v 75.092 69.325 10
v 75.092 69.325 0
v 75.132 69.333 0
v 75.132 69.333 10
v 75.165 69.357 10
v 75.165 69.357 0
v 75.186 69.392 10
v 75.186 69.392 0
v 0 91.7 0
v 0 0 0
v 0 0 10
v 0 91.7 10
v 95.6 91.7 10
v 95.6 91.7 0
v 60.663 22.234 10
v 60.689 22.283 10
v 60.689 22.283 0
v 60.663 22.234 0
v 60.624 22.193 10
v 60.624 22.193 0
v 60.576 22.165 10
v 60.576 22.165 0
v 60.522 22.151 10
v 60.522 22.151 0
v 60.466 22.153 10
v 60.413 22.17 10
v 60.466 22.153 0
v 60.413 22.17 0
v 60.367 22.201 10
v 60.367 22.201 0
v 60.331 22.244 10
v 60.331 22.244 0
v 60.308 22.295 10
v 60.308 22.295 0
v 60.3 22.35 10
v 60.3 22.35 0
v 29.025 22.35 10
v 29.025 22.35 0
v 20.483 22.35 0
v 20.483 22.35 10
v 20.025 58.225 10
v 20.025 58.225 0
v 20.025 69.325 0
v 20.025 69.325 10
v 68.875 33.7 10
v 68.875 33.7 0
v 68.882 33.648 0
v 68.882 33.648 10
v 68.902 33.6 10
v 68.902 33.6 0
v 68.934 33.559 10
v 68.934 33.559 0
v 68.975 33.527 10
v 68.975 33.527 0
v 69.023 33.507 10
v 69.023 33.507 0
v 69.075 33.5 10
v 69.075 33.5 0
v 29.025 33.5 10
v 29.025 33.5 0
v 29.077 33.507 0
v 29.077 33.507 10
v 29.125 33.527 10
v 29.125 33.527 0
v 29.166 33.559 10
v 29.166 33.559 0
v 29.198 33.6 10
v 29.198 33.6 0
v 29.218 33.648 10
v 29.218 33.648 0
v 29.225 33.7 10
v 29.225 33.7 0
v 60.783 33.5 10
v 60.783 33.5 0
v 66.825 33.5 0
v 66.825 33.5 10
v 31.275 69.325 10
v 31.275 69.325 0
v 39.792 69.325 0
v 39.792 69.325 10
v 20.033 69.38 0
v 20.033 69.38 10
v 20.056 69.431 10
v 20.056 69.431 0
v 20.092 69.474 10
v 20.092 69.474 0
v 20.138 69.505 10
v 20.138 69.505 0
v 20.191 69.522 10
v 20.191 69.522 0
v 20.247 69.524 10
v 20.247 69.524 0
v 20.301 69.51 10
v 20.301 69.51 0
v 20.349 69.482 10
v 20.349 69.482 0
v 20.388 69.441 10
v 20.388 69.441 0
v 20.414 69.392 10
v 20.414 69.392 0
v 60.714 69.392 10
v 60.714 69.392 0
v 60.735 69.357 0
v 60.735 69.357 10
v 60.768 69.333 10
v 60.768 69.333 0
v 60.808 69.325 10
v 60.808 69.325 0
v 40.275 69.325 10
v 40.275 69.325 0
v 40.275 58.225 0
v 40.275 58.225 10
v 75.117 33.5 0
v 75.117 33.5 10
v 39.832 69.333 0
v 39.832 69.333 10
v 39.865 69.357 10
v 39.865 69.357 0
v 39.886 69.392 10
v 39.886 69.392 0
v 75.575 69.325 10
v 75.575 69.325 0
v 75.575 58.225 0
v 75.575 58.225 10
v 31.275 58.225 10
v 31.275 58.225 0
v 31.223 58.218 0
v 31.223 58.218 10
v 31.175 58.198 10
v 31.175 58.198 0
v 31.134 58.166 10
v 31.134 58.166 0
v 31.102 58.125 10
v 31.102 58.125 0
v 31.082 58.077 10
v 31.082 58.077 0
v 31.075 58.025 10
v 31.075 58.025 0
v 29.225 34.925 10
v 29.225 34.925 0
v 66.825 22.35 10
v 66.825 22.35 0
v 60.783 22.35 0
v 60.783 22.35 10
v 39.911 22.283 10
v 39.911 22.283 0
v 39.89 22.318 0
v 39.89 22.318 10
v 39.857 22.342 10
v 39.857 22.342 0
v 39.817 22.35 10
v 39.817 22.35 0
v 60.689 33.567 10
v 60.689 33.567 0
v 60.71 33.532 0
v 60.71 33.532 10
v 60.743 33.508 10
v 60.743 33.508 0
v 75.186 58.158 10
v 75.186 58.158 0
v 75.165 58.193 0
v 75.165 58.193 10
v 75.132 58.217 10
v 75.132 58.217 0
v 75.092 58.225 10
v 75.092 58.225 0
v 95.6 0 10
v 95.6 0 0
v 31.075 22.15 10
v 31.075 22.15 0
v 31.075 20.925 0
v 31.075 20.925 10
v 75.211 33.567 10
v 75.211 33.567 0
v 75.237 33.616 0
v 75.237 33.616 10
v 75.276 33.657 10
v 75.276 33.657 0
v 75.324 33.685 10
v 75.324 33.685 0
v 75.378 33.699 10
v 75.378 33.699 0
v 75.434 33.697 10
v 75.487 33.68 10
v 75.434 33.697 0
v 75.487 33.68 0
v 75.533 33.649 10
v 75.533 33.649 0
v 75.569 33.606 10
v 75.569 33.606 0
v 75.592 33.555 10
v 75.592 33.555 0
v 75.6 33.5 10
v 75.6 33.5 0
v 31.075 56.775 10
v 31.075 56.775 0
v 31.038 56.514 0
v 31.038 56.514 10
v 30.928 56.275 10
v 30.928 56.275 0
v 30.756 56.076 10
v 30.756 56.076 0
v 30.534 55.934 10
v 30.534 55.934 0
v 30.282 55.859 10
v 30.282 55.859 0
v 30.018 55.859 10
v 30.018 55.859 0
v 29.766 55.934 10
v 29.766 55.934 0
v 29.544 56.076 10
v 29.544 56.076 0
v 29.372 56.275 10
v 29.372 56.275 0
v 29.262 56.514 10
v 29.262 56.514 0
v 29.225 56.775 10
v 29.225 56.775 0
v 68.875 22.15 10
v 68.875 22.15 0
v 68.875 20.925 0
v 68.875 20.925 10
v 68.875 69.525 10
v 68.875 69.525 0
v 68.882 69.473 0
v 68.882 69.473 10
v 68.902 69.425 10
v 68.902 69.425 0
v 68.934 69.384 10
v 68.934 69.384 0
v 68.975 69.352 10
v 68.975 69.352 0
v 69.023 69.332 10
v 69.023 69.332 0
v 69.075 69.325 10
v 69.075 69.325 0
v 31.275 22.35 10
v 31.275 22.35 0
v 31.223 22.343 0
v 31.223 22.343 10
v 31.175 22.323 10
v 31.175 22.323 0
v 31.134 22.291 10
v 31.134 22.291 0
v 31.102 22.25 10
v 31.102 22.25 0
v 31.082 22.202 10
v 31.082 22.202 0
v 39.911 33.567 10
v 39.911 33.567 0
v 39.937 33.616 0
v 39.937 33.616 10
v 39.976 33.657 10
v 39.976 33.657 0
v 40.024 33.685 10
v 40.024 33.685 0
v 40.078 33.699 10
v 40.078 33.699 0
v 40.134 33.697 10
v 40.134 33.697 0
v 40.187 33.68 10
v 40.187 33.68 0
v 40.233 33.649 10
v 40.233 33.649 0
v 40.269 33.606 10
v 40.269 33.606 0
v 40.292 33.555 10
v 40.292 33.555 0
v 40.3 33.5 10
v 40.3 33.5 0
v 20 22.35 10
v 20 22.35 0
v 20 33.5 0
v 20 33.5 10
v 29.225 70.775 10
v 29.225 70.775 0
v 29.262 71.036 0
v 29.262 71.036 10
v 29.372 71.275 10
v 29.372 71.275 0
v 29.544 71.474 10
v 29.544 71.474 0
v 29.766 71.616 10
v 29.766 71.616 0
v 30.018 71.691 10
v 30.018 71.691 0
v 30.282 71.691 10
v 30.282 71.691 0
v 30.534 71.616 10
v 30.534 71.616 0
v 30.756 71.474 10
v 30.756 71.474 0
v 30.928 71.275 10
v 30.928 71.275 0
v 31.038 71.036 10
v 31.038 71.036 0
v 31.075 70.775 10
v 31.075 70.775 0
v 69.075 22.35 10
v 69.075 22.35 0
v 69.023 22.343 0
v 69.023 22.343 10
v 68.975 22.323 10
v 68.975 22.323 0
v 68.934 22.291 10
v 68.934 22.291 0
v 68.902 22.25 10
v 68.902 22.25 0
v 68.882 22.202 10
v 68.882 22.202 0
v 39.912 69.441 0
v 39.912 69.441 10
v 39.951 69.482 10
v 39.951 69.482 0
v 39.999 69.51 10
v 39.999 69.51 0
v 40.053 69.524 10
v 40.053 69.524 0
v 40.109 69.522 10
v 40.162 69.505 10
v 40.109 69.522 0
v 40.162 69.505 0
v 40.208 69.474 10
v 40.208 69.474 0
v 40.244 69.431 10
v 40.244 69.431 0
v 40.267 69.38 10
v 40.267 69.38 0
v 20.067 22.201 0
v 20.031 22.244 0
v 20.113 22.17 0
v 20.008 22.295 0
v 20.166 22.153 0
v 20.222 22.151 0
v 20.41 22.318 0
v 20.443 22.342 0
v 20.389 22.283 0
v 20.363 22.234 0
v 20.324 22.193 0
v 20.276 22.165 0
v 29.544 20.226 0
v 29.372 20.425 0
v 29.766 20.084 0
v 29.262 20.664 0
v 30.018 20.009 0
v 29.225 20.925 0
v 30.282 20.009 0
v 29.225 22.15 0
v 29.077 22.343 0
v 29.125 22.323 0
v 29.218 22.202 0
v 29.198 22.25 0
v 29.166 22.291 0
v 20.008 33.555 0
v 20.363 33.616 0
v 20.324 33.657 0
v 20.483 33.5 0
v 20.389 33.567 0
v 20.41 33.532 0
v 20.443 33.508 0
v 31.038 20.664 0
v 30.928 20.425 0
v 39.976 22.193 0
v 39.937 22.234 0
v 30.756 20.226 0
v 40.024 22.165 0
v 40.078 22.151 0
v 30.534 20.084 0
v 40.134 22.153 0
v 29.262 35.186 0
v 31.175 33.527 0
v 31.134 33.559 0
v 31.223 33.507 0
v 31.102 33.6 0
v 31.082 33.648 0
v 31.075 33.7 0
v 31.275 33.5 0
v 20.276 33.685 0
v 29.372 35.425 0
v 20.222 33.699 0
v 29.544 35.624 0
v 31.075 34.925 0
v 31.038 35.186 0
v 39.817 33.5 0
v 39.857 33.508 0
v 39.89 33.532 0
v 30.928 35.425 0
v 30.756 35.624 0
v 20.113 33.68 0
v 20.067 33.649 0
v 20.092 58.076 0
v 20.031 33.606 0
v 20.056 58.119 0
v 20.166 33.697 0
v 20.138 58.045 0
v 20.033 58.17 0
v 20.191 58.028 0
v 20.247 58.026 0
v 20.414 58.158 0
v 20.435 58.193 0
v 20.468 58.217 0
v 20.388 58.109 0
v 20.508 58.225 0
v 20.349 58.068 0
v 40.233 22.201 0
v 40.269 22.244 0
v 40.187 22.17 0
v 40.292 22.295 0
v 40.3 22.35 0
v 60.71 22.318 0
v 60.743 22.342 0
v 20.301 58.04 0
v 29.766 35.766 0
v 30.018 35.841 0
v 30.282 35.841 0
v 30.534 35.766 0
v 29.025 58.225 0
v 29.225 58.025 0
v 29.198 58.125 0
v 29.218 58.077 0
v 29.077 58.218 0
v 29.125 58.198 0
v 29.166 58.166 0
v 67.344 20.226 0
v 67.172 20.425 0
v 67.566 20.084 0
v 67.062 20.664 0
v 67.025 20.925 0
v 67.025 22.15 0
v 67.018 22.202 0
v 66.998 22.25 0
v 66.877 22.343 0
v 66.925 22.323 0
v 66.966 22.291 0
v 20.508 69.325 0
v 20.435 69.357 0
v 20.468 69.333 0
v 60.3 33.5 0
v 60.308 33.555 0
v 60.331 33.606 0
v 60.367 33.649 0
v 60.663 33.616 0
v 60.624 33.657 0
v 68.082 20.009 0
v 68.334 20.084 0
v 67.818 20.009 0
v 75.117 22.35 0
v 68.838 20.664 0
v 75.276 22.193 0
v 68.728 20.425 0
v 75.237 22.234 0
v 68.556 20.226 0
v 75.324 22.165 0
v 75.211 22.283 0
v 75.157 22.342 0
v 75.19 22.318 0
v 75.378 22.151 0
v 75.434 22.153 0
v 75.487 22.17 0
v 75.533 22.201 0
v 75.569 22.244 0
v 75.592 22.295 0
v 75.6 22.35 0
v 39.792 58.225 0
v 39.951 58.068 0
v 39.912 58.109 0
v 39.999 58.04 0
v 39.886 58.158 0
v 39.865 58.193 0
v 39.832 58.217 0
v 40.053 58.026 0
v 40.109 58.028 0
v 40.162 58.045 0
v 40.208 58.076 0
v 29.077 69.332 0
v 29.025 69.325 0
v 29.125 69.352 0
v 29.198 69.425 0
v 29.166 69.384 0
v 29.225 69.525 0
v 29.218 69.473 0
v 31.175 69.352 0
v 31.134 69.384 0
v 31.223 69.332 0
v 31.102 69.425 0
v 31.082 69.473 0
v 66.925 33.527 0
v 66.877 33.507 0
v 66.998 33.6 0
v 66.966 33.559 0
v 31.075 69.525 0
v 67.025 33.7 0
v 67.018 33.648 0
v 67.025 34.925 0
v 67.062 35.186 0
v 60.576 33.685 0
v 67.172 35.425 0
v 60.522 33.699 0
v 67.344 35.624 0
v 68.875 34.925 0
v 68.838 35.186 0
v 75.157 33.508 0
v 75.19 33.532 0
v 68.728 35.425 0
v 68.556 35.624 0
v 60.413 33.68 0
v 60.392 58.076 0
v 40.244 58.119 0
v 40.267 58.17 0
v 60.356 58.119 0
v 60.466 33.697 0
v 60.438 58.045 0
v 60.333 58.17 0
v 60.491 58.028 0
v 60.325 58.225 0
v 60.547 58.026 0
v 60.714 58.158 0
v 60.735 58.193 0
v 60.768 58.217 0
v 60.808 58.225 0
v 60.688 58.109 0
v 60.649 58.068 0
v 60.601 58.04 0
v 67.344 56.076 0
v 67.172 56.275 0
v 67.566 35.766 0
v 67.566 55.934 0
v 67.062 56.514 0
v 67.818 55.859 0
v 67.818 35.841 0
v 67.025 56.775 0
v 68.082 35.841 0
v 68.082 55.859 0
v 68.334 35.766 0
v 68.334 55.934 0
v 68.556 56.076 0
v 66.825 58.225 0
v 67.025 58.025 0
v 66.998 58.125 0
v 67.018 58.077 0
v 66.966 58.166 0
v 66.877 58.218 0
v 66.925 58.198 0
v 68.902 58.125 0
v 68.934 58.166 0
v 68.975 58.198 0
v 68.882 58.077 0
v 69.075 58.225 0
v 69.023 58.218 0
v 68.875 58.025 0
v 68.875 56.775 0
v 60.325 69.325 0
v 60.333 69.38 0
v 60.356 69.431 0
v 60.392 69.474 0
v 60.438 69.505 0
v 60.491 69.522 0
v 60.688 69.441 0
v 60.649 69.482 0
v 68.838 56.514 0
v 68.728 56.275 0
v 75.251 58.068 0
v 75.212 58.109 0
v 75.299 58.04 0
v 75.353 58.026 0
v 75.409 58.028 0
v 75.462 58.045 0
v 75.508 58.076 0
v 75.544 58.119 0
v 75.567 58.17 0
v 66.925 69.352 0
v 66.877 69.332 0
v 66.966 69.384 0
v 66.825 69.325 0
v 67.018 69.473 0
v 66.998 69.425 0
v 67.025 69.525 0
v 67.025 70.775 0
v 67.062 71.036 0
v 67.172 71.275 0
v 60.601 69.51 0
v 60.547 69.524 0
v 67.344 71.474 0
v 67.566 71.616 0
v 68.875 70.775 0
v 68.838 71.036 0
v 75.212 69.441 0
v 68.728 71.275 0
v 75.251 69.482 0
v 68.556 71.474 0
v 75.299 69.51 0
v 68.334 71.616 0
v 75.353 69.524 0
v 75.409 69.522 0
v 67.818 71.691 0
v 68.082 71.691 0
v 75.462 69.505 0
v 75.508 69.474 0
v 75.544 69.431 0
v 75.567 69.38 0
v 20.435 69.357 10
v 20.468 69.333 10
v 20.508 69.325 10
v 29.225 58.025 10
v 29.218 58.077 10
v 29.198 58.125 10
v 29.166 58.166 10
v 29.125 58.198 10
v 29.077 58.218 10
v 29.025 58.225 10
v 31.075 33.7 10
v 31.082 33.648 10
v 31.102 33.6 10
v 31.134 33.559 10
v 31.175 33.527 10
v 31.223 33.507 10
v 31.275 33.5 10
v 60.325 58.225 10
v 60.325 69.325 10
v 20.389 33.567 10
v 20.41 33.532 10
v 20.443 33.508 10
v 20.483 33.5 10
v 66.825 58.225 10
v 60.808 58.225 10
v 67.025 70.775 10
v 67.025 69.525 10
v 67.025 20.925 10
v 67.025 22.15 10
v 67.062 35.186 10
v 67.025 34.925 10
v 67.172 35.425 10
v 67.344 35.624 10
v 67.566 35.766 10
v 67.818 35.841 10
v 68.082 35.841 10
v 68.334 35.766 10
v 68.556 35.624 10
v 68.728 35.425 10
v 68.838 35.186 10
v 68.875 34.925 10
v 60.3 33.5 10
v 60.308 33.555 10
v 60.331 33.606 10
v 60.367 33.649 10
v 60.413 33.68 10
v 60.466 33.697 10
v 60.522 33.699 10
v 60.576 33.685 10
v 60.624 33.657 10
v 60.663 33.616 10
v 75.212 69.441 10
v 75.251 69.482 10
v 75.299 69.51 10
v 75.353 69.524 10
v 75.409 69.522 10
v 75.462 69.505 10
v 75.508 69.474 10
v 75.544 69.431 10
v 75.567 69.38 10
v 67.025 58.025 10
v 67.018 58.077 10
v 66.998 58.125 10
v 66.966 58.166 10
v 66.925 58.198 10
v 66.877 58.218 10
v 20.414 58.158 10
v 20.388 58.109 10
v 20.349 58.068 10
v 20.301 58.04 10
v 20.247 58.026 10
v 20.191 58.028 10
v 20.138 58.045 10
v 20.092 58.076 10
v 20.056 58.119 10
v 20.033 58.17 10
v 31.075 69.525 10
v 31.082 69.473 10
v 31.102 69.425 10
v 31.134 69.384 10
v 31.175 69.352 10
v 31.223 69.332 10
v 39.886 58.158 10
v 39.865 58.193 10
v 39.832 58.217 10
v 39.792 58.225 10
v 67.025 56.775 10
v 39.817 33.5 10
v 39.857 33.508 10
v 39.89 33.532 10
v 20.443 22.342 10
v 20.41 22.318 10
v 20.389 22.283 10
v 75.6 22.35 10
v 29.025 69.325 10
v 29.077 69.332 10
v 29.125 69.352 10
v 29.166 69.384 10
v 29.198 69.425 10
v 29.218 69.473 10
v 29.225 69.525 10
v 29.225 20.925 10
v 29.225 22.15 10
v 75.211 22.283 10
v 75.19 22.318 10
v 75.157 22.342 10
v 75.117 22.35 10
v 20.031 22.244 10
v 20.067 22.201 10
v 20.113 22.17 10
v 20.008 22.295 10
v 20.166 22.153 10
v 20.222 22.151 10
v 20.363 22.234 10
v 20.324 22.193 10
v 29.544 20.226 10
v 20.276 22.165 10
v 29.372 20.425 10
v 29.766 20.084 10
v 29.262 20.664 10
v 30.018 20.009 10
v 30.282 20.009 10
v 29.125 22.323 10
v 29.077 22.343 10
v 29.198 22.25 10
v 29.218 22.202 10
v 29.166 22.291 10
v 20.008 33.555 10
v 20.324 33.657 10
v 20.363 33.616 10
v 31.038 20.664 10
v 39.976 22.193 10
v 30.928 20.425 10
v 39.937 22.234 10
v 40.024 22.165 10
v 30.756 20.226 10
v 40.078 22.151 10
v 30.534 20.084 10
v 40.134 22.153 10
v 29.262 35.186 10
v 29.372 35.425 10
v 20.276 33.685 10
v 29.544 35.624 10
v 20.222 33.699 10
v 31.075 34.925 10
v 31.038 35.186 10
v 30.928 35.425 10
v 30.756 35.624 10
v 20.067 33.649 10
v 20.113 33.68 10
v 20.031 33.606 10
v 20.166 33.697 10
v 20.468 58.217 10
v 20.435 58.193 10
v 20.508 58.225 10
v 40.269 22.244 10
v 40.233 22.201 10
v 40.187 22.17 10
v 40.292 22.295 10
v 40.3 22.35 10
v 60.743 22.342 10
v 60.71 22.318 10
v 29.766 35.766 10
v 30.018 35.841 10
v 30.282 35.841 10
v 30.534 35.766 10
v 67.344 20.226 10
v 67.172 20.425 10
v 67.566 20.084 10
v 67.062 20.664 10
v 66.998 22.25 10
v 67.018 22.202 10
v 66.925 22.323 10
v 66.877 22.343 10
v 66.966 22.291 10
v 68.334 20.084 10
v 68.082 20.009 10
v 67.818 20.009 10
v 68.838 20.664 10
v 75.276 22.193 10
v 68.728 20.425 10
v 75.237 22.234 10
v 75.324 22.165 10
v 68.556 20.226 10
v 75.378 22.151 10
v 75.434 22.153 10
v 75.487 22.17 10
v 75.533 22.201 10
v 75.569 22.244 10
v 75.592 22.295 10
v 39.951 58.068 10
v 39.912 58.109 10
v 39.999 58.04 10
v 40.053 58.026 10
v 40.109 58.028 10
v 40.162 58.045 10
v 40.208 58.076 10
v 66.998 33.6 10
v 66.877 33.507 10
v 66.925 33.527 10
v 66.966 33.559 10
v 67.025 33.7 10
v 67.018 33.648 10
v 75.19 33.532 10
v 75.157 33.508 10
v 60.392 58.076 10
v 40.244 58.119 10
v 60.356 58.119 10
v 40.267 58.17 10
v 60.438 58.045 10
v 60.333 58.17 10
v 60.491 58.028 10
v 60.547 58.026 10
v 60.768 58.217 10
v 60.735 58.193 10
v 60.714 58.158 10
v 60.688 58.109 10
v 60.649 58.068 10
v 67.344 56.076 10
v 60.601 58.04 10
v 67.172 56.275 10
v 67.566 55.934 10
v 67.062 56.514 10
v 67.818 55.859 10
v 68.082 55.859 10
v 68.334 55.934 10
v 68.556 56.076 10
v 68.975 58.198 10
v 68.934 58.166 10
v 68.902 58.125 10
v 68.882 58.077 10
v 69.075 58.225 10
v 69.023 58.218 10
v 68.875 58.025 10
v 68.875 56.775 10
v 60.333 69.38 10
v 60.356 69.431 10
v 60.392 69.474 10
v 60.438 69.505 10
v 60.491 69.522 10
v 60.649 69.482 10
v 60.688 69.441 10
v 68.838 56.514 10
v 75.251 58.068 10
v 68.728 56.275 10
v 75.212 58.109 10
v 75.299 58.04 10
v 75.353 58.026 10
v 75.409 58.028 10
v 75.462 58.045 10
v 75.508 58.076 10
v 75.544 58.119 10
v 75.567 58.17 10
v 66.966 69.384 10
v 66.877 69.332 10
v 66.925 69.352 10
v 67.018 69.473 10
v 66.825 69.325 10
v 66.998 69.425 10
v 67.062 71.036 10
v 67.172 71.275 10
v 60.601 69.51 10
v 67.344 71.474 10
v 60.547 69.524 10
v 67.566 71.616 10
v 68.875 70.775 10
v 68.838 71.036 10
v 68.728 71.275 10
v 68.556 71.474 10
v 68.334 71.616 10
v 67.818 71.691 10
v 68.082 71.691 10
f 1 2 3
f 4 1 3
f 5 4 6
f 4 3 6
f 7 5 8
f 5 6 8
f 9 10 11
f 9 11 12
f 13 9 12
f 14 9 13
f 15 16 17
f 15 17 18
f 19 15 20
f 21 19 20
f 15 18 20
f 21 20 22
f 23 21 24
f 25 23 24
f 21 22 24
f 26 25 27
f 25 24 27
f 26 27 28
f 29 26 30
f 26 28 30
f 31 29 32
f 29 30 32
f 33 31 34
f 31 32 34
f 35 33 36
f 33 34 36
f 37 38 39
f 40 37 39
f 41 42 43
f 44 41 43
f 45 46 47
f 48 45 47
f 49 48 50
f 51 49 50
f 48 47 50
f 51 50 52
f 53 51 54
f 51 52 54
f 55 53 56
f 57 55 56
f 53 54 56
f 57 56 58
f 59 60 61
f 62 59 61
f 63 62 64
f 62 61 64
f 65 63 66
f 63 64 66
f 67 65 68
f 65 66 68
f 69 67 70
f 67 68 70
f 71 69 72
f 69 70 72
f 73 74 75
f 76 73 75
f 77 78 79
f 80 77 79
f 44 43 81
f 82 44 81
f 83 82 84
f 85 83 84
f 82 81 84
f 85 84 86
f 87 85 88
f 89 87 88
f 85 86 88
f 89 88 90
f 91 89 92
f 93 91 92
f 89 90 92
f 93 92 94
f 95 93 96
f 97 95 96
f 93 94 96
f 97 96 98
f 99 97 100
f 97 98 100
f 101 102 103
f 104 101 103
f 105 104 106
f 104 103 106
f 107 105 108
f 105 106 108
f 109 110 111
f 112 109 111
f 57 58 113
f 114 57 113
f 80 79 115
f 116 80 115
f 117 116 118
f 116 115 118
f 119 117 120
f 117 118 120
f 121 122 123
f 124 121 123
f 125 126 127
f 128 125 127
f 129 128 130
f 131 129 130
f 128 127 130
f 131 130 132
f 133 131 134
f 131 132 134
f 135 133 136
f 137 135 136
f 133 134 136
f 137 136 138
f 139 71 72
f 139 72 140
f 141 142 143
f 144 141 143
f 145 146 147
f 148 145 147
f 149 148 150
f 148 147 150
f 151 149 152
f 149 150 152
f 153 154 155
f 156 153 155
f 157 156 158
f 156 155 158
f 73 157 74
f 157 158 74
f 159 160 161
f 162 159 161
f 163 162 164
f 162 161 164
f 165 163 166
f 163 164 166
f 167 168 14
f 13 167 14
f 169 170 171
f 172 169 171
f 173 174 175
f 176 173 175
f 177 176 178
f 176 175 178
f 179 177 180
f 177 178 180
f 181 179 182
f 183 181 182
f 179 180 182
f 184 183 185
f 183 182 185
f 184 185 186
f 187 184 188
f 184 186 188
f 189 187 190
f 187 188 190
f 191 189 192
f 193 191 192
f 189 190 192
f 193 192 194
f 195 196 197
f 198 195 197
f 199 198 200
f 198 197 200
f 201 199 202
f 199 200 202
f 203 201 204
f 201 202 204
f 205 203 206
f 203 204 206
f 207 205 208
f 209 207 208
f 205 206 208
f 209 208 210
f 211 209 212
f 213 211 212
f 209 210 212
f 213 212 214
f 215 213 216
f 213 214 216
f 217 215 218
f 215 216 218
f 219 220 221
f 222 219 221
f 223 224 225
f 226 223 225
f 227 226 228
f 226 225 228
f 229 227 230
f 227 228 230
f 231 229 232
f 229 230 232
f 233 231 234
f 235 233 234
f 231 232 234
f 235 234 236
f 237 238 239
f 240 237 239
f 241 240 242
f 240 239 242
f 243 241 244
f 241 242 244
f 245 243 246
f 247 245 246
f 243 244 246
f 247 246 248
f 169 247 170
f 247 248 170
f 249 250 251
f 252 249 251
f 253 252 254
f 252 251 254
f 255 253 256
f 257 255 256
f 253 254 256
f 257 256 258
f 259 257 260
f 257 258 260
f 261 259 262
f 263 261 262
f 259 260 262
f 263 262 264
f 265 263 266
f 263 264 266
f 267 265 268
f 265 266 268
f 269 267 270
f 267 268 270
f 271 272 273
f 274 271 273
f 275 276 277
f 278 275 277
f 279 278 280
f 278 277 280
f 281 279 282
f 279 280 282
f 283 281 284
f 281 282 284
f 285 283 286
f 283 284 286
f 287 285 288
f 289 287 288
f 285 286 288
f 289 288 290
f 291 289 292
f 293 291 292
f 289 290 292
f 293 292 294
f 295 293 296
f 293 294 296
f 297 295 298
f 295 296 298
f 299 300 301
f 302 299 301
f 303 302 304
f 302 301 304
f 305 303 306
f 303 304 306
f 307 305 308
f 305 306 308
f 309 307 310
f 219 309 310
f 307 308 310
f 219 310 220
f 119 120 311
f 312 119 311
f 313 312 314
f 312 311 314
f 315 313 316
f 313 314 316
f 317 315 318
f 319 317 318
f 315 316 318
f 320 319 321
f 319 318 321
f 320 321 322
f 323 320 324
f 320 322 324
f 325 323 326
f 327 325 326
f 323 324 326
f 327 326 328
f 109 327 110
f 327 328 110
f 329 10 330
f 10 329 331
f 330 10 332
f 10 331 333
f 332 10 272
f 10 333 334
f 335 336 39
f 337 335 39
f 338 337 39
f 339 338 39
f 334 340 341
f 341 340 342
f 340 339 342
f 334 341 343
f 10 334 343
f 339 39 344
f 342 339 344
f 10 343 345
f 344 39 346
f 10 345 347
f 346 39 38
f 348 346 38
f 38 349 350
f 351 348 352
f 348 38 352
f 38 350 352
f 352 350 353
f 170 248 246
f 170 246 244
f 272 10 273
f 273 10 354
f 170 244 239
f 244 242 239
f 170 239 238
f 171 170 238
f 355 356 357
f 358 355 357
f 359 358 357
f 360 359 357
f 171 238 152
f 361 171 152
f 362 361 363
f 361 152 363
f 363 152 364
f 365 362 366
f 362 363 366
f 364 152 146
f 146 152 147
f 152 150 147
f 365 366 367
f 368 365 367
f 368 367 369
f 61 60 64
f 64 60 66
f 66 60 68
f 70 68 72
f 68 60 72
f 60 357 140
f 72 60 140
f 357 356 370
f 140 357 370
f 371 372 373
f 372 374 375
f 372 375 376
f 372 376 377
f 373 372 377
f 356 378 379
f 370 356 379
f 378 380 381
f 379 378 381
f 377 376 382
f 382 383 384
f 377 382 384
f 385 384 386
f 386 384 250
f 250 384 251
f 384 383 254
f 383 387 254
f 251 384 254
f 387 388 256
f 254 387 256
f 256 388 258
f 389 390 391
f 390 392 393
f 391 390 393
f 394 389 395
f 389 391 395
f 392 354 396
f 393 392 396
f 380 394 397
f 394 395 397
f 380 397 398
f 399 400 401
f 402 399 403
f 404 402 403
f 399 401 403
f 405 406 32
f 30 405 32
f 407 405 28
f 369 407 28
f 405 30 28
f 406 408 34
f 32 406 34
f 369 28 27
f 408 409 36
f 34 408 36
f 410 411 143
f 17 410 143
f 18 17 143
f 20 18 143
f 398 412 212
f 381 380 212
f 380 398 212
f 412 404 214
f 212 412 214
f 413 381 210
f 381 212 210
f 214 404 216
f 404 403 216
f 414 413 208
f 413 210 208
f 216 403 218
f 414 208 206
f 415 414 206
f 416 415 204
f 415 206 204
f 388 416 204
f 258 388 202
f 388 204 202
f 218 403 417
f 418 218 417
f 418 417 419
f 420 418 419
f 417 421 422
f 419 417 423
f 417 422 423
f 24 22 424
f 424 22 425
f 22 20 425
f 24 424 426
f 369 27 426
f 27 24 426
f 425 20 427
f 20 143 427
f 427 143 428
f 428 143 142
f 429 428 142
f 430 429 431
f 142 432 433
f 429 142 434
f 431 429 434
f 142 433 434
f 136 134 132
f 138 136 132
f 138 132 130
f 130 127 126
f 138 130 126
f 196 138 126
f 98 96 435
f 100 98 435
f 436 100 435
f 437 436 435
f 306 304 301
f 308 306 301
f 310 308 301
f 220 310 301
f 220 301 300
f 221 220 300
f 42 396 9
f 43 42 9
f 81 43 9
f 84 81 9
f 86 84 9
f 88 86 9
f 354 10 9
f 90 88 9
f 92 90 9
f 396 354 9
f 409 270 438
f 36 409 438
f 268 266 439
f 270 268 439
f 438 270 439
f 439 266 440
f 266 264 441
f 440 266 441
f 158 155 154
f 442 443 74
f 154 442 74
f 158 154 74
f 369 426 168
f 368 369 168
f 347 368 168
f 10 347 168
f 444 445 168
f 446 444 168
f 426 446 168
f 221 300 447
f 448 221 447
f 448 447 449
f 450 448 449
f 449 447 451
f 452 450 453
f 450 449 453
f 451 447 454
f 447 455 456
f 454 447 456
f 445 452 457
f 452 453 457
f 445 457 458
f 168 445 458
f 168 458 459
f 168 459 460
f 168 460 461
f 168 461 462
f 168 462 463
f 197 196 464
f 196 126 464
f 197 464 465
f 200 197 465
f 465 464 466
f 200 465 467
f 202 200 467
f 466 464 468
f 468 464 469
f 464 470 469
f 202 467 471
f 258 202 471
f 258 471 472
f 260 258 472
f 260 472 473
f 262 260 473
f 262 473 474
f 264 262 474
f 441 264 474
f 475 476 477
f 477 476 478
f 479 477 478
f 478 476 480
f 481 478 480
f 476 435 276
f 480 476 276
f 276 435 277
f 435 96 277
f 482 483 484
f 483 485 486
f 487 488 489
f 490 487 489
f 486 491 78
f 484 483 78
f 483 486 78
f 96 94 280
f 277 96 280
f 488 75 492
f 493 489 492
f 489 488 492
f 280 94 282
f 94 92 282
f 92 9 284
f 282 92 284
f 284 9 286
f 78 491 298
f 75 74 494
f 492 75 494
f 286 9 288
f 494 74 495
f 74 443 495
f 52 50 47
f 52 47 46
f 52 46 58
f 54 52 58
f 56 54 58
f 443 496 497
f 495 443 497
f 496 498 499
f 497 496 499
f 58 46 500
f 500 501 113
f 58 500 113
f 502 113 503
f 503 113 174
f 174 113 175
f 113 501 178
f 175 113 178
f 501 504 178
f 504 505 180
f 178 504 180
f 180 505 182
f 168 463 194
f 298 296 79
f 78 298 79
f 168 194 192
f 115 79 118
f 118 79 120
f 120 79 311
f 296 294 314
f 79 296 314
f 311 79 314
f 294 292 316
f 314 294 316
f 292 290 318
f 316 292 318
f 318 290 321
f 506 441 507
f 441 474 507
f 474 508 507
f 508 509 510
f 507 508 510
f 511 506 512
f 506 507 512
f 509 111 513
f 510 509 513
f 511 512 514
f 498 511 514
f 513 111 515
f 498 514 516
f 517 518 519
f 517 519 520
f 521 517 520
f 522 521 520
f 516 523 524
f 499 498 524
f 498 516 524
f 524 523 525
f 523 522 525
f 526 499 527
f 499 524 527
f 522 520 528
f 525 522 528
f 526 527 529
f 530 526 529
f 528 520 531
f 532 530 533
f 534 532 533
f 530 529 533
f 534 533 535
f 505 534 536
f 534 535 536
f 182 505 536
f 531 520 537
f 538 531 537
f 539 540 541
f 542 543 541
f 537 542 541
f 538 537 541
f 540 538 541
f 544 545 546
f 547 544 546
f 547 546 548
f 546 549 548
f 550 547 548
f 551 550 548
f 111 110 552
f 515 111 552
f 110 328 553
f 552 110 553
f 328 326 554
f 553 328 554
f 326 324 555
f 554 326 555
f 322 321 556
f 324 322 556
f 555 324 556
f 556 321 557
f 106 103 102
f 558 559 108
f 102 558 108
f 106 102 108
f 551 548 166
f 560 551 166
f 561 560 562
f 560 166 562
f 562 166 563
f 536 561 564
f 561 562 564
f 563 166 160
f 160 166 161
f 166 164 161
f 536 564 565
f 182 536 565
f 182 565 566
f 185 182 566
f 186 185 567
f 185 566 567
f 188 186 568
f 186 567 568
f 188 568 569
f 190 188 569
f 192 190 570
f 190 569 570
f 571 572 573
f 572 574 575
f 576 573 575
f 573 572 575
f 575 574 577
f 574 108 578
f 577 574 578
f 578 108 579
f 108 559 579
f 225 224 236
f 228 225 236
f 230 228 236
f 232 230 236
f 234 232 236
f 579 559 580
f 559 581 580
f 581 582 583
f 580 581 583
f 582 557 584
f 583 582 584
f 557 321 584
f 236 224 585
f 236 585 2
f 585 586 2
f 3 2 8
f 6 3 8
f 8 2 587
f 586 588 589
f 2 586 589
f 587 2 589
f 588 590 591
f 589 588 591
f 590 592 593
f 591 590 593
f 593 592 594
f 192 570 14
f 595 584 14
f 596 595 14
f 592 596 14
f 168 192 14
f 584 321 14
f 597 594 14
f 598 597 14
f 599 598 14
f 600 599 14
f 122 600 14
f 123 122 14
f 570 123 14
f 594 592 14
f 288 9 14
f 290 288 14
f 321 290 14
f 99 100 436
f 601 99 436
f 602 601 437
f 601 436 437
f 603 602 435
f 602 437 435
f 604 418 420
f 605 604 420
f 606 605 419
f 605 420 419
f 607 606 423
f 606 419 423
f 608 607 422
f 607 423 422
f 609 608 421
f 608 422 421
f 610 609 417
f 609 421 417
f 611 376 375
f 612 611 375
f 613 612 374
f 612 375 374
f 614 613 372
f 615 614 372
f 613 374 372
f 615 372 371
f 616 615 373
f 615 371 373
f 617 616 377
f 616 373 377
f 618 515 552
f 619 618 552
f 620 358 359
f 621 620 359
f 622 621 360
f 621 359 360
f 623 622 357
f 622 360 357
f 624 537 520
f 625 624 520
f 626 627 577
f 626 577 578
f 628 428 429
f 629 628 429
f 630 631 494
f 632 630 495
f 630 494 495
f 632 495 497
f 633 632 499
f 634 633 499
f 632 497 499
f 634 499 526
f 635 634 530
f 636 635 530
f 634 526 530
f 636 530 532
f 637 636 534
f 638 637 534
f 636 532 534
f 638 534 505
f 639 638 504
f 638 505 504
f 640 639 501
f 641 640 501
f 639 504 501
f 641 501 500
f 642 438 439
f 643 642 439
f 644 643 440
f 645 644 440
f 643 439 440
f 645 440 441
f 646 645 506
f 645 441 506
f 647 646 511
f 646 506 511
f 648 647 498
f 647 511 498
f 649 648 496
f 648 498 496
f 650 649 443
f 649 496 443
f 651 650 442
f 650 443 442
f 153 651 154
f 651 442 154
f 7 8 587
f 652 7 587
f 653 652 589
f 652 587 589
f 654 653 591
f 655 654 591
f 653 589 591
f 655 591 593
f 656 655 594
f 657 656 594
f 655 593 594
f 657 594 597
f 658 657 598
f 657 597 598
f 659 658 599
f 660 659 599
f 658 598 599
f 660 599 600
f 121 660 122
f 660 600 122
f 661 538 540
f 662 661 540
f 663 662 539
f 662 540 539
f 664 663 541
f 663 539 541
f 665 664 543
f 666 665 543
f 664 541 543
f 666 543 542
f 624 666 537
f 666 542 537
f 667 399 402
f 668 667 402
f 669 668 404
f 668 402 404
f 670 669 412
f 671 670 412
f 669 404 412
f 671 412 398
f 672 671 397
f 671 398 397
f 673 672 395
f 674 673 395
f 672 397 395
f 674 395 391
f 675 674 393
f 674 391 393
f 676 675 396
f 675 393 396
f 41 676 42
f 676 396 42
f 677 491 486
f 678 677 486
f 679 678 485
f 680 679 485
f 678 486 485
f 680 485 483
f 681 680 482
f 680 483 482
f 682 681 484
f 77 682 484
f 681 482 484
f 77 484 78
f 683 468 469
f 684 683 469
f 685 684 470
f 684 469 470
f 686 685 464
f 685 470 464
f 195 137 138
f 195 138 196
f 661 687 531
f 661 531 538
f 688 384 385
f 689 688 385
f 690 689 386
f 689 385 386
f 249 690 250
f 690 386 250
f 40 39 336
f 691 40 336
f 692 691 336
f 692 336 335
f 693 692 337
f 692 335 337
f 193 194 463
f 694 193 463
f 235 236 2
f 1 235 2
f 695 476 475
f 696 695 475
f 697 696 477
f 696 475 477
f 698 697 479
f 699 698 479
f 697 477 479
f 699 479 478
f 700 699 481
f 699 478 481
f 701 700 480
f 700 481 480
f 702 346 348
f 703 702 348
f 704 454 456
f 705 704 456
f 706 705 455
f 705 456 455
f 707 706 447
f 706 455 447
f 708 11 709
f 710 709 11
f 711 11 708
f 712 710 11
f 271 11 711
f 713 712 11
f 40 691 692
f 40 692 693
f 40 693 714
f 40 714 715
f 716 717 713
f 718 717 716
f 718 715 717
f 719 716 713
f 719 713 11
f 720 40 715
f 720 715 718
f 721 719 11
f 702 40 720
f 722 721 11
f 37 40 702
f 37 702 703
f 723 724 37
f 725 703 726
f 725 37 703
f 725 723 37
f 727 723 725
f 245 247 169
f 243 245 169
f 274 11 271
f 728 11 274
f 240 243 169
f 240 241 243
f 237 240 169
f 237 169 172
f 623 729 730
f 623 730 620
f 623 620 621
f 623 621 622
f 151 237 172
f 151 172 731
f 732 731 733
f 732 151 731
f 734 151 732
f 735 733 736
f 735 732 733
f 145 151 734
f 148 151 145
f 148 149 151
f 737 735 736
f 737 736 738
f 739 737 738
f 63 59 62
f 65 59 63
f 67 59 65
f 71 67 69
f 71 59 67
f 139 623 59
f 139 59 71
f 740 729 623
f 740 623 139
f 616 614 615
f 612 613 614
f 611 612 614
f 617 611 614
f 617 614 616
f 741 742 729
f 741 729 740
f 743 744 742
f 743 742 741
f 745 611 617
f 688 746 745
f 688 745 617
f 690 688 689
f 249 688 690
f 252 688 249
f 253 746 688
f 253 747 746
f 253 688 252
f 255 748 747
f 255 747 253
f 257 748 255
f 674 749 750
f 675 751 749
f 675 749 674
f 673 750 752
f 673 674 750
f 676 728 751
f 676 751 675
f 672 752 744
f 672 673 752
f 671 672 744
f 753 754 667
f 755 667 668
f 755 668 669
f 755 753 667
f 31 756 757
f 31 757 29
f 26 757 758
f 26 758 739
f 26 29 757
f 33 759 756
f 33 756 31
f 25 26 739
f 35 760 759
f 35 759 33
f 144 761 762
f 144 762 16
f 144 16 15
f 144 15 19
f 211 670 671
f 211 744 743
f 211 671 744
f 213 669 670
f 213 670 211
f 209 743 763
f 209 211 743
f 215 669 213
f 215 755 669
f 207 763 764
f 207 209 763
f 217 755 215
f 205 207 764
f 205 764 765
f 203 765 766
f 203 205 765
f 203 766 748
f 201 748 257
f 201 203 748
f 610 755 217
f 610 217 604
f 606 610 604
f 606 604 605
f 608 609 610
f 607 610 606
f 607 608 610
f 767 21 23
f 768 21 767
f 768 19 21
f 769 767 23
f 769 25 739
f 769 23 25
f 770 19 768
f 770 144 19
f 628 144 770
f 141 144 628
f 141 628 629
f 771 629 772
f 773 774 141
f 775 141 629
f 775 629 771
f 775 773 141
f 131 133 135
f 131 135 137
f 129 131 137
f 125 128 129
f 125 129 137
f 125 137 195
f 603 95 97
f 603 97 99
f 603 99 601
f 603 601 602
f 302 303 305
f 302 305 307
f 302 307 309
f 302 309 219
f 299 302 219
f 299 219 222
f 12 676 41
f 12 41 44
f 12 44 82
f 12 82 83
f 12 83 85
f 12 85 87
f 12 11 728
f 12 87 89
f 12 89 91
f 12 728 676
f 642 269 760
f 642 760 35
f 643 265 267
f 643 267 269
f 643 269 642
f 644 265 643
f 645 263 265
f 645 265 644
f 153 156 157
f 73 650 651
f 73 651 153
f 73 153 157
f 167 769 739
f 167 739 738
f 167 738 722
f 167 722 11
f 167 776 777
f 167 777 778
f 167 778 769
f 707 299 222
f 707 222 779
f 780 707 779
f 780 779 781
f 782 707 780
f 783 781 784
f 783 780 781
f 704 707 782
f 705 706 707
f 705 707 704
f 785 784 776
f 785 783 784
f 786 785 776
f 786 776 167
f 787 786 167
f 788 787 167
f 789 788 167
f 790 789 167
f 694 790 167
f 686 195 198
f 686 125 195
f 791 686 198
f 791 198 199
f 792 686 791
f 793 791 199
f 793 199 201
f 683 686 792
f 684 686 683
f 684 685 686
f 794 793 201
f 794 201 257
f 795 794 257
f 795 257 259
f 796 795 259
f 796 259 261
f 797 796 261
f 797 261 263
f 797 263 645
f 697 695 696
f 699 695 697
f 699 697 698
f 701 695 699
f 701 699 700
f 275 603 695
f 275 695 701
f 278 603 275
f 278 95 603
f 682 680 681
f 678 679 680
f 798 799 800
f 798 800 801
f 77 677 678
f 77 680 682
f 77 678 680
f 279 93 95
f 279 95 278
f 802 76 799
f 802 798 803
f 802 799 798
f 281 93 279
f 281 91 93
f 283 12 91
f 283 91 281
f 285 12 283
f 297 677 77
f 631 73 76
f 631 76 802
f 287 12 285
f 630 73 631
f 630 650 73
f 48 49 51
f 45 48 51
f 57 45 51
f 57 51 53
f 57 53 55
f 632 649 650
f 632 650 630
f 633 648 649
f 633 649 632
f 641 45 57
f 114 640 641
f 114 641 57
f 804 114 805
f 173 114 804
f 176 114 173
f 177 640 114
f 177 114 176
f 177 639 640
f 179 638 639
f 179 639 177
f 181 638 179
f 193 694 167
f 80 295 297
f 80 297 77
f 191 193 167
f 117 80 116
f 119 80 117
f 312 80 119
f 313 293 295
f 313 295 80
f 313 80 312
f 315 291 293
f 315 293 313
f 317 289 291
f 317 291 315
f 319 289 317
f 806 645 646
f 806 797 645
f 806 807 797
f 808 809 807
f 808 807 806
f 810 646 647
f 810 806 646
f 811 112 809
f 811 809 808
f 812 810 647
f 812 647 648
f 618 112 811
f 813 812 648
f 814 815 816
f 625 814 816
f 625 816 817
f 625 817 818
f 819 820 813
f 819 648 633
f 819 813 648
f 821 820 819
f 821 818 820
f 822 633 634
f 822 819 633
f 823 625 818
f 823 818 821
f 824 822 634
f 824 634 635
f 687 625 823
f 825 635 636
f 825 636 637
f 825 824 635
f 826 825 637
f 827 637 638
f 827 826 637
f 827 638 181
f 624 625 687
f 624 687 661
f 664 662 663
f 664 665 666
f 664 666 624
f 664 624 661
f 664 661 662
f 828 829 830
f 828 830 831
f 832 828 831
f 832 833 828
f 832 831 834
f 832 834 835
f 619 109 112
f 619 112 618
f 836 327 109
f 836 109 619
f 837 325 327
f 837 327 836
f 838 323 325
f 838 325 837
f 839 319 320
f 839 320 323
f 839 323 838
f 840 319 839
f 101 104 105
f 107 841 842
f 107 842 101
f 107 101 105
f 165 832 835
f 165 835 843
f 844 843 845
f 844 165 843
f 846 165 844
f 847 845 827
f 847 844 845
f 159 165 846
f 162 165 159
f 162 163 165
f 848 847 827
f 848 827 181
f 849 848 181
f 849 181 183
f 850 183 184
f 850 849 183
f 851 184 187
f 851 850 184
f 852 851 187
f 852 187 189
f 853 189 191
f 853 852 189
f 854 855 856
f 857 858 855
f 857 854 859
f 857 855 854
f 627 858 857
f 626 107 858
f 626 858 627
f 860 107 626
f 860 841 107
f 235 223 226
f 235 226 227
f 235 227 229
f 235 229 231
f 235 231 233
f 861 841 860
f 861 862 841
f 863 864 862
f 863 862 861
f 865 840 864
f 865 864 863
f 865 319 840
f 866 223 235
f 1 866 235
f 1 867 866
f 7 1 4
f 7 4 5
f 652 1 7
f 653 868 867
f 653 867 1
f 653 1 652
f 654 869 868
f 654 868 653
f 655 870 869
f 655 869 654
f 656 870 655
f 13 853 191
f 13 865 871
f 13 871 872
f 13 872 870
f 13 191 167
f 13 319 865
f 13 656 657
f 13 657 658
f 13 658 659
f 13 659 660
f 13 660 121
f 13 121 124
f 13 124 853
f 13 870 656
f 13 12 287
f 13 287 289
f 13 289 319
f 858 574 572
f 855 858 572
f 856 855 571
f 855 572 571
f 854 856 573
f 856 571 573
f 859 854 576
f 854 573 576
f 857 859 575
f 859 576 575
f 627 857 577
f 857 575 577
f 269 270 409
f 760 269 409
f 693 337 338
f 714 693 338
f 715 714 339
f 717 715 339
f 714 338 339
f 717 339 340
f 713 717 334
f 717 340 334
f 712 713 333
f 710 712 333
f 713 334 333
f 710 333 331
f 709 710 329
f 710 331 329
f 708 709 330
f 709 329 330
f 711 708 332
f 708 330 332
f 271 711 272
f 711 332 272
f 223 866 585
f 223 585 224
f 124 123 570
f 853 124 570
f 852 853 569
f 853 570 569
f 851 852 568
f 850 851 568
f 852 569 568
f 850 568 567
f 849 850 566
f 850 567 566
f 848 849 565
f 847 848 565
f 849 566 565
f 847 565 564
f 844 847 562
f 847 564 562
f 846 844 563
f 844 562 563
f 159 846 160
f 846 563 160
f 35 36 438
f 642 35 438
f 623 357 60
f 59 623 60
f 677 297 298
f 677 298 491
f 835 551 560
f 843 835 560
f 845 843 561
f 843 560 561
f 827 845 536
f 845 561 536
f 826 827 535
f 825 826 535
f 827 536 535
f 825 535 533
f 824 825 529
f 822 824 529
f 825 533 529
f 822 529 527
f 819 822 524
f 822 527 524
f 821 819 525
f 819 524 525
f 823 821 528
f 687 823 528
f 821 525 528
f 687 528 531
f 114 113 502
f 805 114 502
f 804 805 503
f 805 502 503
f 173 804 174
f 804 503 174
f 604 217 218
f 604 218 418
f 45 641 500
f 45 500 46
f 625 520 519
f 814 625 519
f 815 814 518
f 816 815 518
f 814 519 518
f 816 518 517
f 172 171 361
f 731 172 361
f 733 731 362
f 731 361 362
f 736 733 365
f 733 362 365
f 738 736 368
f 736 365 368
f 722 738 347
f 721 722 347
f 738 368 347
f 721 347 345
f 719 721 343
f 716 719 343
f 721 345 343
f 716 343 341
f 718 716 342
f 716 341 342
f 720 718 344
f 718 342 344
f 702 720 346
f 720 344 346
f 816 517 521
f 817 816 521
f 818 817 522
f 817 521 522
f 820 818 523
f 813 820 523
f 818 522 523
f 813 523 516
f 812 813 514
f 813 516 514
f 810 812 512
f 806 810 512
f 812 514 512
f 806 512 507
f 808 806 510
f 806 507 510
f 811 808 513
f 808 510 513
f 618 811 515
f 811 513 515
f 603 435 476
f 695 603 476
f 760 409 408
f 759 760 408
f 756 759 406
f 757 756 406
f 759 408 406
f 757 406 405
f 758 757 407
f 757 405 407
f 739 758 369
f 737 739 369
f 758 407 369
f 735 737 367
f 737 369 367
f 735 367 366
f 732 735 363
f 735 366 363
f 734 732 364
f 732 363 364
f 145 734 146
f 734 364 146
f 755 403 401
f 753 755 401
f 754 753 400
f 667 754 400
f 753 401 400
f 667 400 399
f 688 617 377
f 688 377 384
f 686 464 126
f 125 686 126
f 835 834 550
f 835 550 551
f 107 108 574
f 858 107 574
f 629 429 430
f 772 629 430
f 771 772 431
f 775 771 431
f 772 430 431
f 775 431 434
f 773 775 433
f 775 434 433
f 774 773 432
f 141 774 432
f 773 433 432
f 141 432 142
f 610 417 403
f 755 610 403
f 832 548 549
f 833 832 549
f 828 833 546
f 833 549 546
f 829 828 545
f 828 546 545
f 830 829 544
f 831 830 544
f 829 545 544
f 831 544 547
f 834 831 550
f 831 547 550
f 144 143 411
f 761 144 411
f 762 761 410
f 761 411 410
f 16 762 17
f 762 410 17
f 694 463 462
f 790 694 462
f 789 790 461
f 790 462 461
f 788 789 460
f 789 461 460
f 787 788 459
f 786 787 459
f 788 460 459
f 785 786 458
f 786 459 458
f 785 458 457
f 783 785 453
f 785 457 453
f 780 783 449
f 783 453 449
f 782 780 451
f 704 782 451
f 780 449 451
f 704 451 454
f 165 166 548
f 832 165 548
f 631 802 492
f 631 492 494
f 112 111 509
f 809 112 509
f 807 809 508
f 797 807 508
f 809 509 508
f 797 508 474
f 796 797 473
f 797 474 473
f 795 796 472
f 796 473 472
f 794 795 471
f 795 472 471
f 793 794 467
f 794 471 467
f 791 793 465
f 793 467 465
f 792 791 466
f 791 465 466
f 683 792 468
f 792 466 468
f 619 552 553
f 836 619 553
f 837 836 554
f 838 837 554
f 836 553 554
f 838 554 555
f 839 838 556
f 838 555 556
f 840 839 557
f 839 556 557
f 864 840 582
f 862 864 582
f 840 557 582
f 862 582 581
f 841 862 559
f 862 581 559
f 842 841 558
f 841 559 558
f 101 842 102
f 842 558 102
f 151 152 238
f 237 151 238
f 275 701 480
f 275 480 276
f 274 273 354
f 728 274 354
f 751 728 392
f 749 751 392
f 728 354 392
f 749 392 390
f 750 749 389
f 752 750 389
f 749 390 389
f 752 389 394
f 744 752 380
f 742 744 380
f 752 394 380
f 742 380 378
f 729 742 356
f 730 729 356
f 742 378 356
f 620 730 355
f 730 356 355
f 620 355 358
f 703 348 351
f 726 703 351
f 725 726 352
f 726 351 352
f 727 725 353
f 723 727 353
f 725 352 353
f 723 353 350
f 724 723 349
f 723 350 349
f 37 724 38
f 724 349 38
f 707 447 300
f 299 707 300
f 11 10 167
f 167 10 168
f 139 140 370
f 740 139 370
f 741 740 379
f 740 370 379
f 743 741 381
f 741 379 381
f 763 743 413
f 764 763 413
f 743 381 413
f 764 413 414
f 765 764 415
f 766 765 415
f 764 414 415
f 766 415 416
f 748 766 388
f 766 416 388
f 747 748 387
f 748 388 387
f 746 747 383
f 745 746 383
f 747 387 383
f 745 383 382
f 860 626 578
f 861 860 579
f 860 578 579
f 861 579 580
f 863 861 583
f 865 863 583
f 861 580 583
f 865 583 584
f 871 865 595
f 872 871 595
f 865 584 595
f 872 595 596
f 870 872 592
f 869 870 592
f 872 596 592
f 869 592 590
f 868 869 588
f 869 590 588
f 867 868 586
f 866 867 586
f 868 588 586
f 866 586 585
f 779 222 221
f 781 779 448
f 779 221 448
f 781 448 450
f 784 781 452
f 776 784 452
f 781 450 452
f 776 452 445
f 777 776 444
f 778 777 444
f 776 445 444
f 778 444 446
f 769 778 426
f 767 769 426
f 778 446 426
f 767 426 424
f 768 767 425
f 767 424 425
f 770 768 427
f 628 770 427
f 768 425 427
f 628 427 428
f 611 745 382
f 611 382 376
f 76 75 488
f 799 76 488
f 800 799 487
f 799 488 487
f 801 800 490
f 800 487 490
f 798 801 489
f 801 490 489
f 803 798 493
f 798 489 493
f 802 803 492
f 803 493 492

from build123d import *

# Parameters (mm, degrees)
F0_W     = 95.6
F0_H     = 91.7
F1_DEPTH = 10


with BuildPart() as f1:
    # F0 (on Top) → F1 (new body)
    with BuildSketch(Plane.XY):
        with Locations((47.8, 45.85)):
            Rectangle(F0_W, F0_H)
        with BuildLine():
            ThreePointArc((29.025, 33.5), (29.166421, 33.558579), (29.225, 33.7))
            Line((29.225, 33.7), (29.225, 34.925))
            ThreePointArc((29.225, 34.925), (30.15, 35.85), (31.075, 34.925))
            Line((31.075, 34.925), (31.075, 33.7))
            ThreePointArc((31.075, 33.7), (31.133579, 33.558579), (31.275, 33.5))
            Line((31.275, 33.5), (39.817157, 33.5))
            ThreePointArc((39.817157, 33.5), (39.874892, 33.51835), (39.911438, 33.566667))
            ThreePointArc((39.911438, 33.566667), (40.13382, 33.69712), (40.3, 33.5))
            Line((40.3, 33.5), (40.3, 22.35))
            ThreePointArc((40.3, 22.35), (40.13382, 22.15288), (39.911438, 22.283333))
            ThreePointArc((39.911438, 22.283333), (39.874892, 22.33165), (39.817157, 22.35))
            Line((39.817157, 22.35), (31.275, 22.35))
            ThreePointArc((31.275, 22.35), (31.133579, 22.291421), (31.075, 22.15))
            Line((31.075, 22.15), (31.075, 20.925))
            ThreePointArc((31.075, 20.925), (30.15, 20), (29.225, 20.925))
            Line((29.225, 20.925), (29.225, 22.15))
            ThreePointArc((29.225, 22.15), (29.166421, 22.291421), (29.025, 22.35))
            Line((29.025, 22.35), (20.482843, 22.35))
            ThreePointArc((20.482843, 22.35), (20.425108, 22.33165), (20.388562, 22.283333))
            ThreePointArc((20.388562, 22.283333), (20.16618, 22.15288), (20, 22.35))
            Line((20, 22.35), (20, 33.5))
            ThreePointArc((20, 33.5), (20.16618, 33.69712), (20.388562, 33.566667))
            ThreePointArc((20.388562, 33.566667), (20.425108, 33.51835), (20.482843, 33.5))
            Line((20.482843, 33.5), (29.025, 33.5))
        make_face(mode=Mode.SUBTRACT)
        with BuildLine():
            ThreePointArc((66.825, 33.5), (66.966421, 33.558579), (67.025, 33.7))
            Line((67.025, 33.7), (67.025, 34.925))
            ThreePointArc((67.025, 34.925), (67.95, 35.85), (68.875, 34.925))
            Line((68.875, 34.925), (68.875, 33.7))
            ThreePointArc((68.875, 33.7), (68.933579, 33.558579), (69.075, 33.5))
            Line((69.075, 33.5), (75.117157, 33.5))
            ThreePointArc((75.117157, 33.5), (75.174892, 33.51835), (75.211438, 33.566667))
            ThreePointArc((75.211438, 33.566667), (75.43382, 33.69712), (75.6, 33.5))
            Line((75.6, 33.5), (75.6, 22.35))
            ThreePointArc((75.6, 22.35), (75.43382, 22.15288), (75.211438, 22.283333))
            ThreePointArc((75.211438, 22.283333), (75.174892, 22.33165), (75.117157, 22.35))
            Line((75.117157, 22.35), (69.075, 22.35))
            ThreePointArc((69.075, 22.35), (68.933579, 22.291421), (68.875, 22.15))
            Line((68.875, 22.15), (68.875, 20.925))
            ThreePointArc((68.875, 20.925), (67.95, 20), (67.025, 20.925))
            Line((67.025, 20.925), (67.025, 22.15))
            ThreePointArc((67.025, 22.15), (66.966421, 22.291421), (66.825, 22.35))
            Line((66.825, 22.35), (60.782843, 22.35))
            ThreePointArc((60.782843, 22.35), (60.725108, 22.33165), (60.688562, 22.283333))
            ThreePointArc((60.688562, 22.283333), (60.46618, 22.15288), (60.3, 22.35))
            Line((60.3, 22.35), (60.3, 33.5))
            ThreePointArc((60.3, 33.5), (60.46618, 33.69712), (60.688562, 33.566667))
            ThreePointArc((60.688562, 33.566667), (60.725108, 33.51835), (60.782843, 33.5))
            Line((60.782843, 33.5), (66.825, 33.5))
        make_face(mode=Mode.SUBTRACT)
        with BuildLine():
            ThreePointArc((29.025, 69.325), (29.166421, 69.383579), (29.225, 69.525))
            Line((29.225, 69.525), (29.225, 70.775))
            ThreePointArc((29.225, 70.775), (30.15, 71.7), (31.075, 70.775))
            Line((31.075, 70.775), (31.075, 69.525))
            ThreePointArc((31.075, 69.525), (31.133579, 69.383579), (31.275, 69.325))
            Line((31.275, 69.325), (39.792157, 69.325))
            ThreePointArc((39.792157, 69.325), (39.849892, 69.34335), (39.886438, 69.391667))
            ThreePointArc((39.886438, 69.391667), (40.10882, 69.52212), (40.275, 69.325))
            Line((40.275, 69.325), (40.275, 58.225))
            ThreePointArc((40.275, 58.225), (40.10882, 58.02788), (39.886438, 58.158333))
            ThreePointArc((39.886438, 58.158333), (39.849892, 58.20665), (39.792157, 58.225))
            Line((39.792157, 58.225), (31.275, 58.225))
            ThreePointArc((31.275, 58.225), (31.133579, 58.166421), (31.075, 58.025))
            Line((31.075, 58.025), (31.075, 56.775))
            ThreePointArc((31.075, 56.775), (30.15, 55.85), (29.225, 56.775))
            Line((29.225, 56.775), (29.225, 58.025))
            ThreePointArc((29.225, 58.025), (29.166421, 58.166421), (29.025, 58.225))
            Line((29.025, 58.225), (20.507843, 58.225))
            ThreePointArc((20.507843, 58.225), (20.450108, 58.20665), (20.413562, 58.158333))
            ThreePointArc((20.413562, 58.158333), (20.19118, 58.02788), (20.025, 58.225))
            Line((20.025, 58.225), (20.025, 69.325))
            ThreePointArc((20.025, 69.325), (20.19118, 69.52212), (20.413562, 69.391667))
            ThreePointArc((20.413562, 69.391667), (20.450108, 69.34335), (20.507843, 69.325))
            Line((20.507843, 69.325), (29.025, 69.325))
        make_face(mode=Mode.SUBTRACT)
        with BuildLine():
            ThreePointArc((66.825, 69.325), (66.966421, 69.383579), (67.025, 69.525))
            Line((67.025, 69.525), (67.025, 70.775))
            ThreePointArc((67.025, 70.775), (67.95, 71.7), (68.875, 70.775))
            Line((68.875, 70.775), (68.875, 69.525))
            ThreePointArc((68.875, 69.525), (68.933579, 69.383579), (69.075, 69.325))
            Line((69.075, 69.325), (75.092157, 69.325))
            ThreePointArc((75.092157, 69.325), (75.149892, 69.34335), (75.186438, 69.391667))
            ThreePointArc((75.186438, 69.391667), (75.40882, 69.52212), (75.575, 69.325))
            Line((75.575, 69.325), (75.575, 58.225))
            ThreePointArc((75.575, 58.225), (75.40882, 58.02788), (75.186438, 58.158333))
            ThreePointArc((75.186438, 58.158333), (75.149892, 58.20665), (75.092157, 58.225))
            Line((75.092157, 58.225), (69.075, 58.225))
            ThreePointArc((69.075, 58.225), (68.933579, 58.166421), (68.875, 58.025))
            Line((68.875, 58.025), (68.875, 56.775))
            ThreePointArc((68.875, 56.775), (67.95, 55.85), (67.025, 56.775))
            Line((67.025, 56.775), (67.025, 58.025))
            ThreePointArc((67.025, 58.025), (66.966421, 58.166421), (66.825, 58.225))
            Line((66.825, 58.225), (60.807843, 58.225))
            ThreePointArc((60.807843, 58.225), (60.750108, 58.20665), (60.713562, 58.158333))
            ThreePointArc((60.713562, 58.158333), (60.49118, 58.02788), (60.325, 58.225))
            Line((60.325, 58.225), (60.325, 69.325))
            ThreePointArc((60.325, 69.325), (60.49118, 69.52212), (60.713562, 69.391667))
            ThreePointArc((60.713562, 69.391667), (60.750108, 69.34335), (60.807843, 69.325))
            Line((60.807843, 69.325), (66.825, 69.325))
        make_face(mode=Mode.SUBTRACT)
    extrude(amount=F1_DEPTH)


solid = f1.part
